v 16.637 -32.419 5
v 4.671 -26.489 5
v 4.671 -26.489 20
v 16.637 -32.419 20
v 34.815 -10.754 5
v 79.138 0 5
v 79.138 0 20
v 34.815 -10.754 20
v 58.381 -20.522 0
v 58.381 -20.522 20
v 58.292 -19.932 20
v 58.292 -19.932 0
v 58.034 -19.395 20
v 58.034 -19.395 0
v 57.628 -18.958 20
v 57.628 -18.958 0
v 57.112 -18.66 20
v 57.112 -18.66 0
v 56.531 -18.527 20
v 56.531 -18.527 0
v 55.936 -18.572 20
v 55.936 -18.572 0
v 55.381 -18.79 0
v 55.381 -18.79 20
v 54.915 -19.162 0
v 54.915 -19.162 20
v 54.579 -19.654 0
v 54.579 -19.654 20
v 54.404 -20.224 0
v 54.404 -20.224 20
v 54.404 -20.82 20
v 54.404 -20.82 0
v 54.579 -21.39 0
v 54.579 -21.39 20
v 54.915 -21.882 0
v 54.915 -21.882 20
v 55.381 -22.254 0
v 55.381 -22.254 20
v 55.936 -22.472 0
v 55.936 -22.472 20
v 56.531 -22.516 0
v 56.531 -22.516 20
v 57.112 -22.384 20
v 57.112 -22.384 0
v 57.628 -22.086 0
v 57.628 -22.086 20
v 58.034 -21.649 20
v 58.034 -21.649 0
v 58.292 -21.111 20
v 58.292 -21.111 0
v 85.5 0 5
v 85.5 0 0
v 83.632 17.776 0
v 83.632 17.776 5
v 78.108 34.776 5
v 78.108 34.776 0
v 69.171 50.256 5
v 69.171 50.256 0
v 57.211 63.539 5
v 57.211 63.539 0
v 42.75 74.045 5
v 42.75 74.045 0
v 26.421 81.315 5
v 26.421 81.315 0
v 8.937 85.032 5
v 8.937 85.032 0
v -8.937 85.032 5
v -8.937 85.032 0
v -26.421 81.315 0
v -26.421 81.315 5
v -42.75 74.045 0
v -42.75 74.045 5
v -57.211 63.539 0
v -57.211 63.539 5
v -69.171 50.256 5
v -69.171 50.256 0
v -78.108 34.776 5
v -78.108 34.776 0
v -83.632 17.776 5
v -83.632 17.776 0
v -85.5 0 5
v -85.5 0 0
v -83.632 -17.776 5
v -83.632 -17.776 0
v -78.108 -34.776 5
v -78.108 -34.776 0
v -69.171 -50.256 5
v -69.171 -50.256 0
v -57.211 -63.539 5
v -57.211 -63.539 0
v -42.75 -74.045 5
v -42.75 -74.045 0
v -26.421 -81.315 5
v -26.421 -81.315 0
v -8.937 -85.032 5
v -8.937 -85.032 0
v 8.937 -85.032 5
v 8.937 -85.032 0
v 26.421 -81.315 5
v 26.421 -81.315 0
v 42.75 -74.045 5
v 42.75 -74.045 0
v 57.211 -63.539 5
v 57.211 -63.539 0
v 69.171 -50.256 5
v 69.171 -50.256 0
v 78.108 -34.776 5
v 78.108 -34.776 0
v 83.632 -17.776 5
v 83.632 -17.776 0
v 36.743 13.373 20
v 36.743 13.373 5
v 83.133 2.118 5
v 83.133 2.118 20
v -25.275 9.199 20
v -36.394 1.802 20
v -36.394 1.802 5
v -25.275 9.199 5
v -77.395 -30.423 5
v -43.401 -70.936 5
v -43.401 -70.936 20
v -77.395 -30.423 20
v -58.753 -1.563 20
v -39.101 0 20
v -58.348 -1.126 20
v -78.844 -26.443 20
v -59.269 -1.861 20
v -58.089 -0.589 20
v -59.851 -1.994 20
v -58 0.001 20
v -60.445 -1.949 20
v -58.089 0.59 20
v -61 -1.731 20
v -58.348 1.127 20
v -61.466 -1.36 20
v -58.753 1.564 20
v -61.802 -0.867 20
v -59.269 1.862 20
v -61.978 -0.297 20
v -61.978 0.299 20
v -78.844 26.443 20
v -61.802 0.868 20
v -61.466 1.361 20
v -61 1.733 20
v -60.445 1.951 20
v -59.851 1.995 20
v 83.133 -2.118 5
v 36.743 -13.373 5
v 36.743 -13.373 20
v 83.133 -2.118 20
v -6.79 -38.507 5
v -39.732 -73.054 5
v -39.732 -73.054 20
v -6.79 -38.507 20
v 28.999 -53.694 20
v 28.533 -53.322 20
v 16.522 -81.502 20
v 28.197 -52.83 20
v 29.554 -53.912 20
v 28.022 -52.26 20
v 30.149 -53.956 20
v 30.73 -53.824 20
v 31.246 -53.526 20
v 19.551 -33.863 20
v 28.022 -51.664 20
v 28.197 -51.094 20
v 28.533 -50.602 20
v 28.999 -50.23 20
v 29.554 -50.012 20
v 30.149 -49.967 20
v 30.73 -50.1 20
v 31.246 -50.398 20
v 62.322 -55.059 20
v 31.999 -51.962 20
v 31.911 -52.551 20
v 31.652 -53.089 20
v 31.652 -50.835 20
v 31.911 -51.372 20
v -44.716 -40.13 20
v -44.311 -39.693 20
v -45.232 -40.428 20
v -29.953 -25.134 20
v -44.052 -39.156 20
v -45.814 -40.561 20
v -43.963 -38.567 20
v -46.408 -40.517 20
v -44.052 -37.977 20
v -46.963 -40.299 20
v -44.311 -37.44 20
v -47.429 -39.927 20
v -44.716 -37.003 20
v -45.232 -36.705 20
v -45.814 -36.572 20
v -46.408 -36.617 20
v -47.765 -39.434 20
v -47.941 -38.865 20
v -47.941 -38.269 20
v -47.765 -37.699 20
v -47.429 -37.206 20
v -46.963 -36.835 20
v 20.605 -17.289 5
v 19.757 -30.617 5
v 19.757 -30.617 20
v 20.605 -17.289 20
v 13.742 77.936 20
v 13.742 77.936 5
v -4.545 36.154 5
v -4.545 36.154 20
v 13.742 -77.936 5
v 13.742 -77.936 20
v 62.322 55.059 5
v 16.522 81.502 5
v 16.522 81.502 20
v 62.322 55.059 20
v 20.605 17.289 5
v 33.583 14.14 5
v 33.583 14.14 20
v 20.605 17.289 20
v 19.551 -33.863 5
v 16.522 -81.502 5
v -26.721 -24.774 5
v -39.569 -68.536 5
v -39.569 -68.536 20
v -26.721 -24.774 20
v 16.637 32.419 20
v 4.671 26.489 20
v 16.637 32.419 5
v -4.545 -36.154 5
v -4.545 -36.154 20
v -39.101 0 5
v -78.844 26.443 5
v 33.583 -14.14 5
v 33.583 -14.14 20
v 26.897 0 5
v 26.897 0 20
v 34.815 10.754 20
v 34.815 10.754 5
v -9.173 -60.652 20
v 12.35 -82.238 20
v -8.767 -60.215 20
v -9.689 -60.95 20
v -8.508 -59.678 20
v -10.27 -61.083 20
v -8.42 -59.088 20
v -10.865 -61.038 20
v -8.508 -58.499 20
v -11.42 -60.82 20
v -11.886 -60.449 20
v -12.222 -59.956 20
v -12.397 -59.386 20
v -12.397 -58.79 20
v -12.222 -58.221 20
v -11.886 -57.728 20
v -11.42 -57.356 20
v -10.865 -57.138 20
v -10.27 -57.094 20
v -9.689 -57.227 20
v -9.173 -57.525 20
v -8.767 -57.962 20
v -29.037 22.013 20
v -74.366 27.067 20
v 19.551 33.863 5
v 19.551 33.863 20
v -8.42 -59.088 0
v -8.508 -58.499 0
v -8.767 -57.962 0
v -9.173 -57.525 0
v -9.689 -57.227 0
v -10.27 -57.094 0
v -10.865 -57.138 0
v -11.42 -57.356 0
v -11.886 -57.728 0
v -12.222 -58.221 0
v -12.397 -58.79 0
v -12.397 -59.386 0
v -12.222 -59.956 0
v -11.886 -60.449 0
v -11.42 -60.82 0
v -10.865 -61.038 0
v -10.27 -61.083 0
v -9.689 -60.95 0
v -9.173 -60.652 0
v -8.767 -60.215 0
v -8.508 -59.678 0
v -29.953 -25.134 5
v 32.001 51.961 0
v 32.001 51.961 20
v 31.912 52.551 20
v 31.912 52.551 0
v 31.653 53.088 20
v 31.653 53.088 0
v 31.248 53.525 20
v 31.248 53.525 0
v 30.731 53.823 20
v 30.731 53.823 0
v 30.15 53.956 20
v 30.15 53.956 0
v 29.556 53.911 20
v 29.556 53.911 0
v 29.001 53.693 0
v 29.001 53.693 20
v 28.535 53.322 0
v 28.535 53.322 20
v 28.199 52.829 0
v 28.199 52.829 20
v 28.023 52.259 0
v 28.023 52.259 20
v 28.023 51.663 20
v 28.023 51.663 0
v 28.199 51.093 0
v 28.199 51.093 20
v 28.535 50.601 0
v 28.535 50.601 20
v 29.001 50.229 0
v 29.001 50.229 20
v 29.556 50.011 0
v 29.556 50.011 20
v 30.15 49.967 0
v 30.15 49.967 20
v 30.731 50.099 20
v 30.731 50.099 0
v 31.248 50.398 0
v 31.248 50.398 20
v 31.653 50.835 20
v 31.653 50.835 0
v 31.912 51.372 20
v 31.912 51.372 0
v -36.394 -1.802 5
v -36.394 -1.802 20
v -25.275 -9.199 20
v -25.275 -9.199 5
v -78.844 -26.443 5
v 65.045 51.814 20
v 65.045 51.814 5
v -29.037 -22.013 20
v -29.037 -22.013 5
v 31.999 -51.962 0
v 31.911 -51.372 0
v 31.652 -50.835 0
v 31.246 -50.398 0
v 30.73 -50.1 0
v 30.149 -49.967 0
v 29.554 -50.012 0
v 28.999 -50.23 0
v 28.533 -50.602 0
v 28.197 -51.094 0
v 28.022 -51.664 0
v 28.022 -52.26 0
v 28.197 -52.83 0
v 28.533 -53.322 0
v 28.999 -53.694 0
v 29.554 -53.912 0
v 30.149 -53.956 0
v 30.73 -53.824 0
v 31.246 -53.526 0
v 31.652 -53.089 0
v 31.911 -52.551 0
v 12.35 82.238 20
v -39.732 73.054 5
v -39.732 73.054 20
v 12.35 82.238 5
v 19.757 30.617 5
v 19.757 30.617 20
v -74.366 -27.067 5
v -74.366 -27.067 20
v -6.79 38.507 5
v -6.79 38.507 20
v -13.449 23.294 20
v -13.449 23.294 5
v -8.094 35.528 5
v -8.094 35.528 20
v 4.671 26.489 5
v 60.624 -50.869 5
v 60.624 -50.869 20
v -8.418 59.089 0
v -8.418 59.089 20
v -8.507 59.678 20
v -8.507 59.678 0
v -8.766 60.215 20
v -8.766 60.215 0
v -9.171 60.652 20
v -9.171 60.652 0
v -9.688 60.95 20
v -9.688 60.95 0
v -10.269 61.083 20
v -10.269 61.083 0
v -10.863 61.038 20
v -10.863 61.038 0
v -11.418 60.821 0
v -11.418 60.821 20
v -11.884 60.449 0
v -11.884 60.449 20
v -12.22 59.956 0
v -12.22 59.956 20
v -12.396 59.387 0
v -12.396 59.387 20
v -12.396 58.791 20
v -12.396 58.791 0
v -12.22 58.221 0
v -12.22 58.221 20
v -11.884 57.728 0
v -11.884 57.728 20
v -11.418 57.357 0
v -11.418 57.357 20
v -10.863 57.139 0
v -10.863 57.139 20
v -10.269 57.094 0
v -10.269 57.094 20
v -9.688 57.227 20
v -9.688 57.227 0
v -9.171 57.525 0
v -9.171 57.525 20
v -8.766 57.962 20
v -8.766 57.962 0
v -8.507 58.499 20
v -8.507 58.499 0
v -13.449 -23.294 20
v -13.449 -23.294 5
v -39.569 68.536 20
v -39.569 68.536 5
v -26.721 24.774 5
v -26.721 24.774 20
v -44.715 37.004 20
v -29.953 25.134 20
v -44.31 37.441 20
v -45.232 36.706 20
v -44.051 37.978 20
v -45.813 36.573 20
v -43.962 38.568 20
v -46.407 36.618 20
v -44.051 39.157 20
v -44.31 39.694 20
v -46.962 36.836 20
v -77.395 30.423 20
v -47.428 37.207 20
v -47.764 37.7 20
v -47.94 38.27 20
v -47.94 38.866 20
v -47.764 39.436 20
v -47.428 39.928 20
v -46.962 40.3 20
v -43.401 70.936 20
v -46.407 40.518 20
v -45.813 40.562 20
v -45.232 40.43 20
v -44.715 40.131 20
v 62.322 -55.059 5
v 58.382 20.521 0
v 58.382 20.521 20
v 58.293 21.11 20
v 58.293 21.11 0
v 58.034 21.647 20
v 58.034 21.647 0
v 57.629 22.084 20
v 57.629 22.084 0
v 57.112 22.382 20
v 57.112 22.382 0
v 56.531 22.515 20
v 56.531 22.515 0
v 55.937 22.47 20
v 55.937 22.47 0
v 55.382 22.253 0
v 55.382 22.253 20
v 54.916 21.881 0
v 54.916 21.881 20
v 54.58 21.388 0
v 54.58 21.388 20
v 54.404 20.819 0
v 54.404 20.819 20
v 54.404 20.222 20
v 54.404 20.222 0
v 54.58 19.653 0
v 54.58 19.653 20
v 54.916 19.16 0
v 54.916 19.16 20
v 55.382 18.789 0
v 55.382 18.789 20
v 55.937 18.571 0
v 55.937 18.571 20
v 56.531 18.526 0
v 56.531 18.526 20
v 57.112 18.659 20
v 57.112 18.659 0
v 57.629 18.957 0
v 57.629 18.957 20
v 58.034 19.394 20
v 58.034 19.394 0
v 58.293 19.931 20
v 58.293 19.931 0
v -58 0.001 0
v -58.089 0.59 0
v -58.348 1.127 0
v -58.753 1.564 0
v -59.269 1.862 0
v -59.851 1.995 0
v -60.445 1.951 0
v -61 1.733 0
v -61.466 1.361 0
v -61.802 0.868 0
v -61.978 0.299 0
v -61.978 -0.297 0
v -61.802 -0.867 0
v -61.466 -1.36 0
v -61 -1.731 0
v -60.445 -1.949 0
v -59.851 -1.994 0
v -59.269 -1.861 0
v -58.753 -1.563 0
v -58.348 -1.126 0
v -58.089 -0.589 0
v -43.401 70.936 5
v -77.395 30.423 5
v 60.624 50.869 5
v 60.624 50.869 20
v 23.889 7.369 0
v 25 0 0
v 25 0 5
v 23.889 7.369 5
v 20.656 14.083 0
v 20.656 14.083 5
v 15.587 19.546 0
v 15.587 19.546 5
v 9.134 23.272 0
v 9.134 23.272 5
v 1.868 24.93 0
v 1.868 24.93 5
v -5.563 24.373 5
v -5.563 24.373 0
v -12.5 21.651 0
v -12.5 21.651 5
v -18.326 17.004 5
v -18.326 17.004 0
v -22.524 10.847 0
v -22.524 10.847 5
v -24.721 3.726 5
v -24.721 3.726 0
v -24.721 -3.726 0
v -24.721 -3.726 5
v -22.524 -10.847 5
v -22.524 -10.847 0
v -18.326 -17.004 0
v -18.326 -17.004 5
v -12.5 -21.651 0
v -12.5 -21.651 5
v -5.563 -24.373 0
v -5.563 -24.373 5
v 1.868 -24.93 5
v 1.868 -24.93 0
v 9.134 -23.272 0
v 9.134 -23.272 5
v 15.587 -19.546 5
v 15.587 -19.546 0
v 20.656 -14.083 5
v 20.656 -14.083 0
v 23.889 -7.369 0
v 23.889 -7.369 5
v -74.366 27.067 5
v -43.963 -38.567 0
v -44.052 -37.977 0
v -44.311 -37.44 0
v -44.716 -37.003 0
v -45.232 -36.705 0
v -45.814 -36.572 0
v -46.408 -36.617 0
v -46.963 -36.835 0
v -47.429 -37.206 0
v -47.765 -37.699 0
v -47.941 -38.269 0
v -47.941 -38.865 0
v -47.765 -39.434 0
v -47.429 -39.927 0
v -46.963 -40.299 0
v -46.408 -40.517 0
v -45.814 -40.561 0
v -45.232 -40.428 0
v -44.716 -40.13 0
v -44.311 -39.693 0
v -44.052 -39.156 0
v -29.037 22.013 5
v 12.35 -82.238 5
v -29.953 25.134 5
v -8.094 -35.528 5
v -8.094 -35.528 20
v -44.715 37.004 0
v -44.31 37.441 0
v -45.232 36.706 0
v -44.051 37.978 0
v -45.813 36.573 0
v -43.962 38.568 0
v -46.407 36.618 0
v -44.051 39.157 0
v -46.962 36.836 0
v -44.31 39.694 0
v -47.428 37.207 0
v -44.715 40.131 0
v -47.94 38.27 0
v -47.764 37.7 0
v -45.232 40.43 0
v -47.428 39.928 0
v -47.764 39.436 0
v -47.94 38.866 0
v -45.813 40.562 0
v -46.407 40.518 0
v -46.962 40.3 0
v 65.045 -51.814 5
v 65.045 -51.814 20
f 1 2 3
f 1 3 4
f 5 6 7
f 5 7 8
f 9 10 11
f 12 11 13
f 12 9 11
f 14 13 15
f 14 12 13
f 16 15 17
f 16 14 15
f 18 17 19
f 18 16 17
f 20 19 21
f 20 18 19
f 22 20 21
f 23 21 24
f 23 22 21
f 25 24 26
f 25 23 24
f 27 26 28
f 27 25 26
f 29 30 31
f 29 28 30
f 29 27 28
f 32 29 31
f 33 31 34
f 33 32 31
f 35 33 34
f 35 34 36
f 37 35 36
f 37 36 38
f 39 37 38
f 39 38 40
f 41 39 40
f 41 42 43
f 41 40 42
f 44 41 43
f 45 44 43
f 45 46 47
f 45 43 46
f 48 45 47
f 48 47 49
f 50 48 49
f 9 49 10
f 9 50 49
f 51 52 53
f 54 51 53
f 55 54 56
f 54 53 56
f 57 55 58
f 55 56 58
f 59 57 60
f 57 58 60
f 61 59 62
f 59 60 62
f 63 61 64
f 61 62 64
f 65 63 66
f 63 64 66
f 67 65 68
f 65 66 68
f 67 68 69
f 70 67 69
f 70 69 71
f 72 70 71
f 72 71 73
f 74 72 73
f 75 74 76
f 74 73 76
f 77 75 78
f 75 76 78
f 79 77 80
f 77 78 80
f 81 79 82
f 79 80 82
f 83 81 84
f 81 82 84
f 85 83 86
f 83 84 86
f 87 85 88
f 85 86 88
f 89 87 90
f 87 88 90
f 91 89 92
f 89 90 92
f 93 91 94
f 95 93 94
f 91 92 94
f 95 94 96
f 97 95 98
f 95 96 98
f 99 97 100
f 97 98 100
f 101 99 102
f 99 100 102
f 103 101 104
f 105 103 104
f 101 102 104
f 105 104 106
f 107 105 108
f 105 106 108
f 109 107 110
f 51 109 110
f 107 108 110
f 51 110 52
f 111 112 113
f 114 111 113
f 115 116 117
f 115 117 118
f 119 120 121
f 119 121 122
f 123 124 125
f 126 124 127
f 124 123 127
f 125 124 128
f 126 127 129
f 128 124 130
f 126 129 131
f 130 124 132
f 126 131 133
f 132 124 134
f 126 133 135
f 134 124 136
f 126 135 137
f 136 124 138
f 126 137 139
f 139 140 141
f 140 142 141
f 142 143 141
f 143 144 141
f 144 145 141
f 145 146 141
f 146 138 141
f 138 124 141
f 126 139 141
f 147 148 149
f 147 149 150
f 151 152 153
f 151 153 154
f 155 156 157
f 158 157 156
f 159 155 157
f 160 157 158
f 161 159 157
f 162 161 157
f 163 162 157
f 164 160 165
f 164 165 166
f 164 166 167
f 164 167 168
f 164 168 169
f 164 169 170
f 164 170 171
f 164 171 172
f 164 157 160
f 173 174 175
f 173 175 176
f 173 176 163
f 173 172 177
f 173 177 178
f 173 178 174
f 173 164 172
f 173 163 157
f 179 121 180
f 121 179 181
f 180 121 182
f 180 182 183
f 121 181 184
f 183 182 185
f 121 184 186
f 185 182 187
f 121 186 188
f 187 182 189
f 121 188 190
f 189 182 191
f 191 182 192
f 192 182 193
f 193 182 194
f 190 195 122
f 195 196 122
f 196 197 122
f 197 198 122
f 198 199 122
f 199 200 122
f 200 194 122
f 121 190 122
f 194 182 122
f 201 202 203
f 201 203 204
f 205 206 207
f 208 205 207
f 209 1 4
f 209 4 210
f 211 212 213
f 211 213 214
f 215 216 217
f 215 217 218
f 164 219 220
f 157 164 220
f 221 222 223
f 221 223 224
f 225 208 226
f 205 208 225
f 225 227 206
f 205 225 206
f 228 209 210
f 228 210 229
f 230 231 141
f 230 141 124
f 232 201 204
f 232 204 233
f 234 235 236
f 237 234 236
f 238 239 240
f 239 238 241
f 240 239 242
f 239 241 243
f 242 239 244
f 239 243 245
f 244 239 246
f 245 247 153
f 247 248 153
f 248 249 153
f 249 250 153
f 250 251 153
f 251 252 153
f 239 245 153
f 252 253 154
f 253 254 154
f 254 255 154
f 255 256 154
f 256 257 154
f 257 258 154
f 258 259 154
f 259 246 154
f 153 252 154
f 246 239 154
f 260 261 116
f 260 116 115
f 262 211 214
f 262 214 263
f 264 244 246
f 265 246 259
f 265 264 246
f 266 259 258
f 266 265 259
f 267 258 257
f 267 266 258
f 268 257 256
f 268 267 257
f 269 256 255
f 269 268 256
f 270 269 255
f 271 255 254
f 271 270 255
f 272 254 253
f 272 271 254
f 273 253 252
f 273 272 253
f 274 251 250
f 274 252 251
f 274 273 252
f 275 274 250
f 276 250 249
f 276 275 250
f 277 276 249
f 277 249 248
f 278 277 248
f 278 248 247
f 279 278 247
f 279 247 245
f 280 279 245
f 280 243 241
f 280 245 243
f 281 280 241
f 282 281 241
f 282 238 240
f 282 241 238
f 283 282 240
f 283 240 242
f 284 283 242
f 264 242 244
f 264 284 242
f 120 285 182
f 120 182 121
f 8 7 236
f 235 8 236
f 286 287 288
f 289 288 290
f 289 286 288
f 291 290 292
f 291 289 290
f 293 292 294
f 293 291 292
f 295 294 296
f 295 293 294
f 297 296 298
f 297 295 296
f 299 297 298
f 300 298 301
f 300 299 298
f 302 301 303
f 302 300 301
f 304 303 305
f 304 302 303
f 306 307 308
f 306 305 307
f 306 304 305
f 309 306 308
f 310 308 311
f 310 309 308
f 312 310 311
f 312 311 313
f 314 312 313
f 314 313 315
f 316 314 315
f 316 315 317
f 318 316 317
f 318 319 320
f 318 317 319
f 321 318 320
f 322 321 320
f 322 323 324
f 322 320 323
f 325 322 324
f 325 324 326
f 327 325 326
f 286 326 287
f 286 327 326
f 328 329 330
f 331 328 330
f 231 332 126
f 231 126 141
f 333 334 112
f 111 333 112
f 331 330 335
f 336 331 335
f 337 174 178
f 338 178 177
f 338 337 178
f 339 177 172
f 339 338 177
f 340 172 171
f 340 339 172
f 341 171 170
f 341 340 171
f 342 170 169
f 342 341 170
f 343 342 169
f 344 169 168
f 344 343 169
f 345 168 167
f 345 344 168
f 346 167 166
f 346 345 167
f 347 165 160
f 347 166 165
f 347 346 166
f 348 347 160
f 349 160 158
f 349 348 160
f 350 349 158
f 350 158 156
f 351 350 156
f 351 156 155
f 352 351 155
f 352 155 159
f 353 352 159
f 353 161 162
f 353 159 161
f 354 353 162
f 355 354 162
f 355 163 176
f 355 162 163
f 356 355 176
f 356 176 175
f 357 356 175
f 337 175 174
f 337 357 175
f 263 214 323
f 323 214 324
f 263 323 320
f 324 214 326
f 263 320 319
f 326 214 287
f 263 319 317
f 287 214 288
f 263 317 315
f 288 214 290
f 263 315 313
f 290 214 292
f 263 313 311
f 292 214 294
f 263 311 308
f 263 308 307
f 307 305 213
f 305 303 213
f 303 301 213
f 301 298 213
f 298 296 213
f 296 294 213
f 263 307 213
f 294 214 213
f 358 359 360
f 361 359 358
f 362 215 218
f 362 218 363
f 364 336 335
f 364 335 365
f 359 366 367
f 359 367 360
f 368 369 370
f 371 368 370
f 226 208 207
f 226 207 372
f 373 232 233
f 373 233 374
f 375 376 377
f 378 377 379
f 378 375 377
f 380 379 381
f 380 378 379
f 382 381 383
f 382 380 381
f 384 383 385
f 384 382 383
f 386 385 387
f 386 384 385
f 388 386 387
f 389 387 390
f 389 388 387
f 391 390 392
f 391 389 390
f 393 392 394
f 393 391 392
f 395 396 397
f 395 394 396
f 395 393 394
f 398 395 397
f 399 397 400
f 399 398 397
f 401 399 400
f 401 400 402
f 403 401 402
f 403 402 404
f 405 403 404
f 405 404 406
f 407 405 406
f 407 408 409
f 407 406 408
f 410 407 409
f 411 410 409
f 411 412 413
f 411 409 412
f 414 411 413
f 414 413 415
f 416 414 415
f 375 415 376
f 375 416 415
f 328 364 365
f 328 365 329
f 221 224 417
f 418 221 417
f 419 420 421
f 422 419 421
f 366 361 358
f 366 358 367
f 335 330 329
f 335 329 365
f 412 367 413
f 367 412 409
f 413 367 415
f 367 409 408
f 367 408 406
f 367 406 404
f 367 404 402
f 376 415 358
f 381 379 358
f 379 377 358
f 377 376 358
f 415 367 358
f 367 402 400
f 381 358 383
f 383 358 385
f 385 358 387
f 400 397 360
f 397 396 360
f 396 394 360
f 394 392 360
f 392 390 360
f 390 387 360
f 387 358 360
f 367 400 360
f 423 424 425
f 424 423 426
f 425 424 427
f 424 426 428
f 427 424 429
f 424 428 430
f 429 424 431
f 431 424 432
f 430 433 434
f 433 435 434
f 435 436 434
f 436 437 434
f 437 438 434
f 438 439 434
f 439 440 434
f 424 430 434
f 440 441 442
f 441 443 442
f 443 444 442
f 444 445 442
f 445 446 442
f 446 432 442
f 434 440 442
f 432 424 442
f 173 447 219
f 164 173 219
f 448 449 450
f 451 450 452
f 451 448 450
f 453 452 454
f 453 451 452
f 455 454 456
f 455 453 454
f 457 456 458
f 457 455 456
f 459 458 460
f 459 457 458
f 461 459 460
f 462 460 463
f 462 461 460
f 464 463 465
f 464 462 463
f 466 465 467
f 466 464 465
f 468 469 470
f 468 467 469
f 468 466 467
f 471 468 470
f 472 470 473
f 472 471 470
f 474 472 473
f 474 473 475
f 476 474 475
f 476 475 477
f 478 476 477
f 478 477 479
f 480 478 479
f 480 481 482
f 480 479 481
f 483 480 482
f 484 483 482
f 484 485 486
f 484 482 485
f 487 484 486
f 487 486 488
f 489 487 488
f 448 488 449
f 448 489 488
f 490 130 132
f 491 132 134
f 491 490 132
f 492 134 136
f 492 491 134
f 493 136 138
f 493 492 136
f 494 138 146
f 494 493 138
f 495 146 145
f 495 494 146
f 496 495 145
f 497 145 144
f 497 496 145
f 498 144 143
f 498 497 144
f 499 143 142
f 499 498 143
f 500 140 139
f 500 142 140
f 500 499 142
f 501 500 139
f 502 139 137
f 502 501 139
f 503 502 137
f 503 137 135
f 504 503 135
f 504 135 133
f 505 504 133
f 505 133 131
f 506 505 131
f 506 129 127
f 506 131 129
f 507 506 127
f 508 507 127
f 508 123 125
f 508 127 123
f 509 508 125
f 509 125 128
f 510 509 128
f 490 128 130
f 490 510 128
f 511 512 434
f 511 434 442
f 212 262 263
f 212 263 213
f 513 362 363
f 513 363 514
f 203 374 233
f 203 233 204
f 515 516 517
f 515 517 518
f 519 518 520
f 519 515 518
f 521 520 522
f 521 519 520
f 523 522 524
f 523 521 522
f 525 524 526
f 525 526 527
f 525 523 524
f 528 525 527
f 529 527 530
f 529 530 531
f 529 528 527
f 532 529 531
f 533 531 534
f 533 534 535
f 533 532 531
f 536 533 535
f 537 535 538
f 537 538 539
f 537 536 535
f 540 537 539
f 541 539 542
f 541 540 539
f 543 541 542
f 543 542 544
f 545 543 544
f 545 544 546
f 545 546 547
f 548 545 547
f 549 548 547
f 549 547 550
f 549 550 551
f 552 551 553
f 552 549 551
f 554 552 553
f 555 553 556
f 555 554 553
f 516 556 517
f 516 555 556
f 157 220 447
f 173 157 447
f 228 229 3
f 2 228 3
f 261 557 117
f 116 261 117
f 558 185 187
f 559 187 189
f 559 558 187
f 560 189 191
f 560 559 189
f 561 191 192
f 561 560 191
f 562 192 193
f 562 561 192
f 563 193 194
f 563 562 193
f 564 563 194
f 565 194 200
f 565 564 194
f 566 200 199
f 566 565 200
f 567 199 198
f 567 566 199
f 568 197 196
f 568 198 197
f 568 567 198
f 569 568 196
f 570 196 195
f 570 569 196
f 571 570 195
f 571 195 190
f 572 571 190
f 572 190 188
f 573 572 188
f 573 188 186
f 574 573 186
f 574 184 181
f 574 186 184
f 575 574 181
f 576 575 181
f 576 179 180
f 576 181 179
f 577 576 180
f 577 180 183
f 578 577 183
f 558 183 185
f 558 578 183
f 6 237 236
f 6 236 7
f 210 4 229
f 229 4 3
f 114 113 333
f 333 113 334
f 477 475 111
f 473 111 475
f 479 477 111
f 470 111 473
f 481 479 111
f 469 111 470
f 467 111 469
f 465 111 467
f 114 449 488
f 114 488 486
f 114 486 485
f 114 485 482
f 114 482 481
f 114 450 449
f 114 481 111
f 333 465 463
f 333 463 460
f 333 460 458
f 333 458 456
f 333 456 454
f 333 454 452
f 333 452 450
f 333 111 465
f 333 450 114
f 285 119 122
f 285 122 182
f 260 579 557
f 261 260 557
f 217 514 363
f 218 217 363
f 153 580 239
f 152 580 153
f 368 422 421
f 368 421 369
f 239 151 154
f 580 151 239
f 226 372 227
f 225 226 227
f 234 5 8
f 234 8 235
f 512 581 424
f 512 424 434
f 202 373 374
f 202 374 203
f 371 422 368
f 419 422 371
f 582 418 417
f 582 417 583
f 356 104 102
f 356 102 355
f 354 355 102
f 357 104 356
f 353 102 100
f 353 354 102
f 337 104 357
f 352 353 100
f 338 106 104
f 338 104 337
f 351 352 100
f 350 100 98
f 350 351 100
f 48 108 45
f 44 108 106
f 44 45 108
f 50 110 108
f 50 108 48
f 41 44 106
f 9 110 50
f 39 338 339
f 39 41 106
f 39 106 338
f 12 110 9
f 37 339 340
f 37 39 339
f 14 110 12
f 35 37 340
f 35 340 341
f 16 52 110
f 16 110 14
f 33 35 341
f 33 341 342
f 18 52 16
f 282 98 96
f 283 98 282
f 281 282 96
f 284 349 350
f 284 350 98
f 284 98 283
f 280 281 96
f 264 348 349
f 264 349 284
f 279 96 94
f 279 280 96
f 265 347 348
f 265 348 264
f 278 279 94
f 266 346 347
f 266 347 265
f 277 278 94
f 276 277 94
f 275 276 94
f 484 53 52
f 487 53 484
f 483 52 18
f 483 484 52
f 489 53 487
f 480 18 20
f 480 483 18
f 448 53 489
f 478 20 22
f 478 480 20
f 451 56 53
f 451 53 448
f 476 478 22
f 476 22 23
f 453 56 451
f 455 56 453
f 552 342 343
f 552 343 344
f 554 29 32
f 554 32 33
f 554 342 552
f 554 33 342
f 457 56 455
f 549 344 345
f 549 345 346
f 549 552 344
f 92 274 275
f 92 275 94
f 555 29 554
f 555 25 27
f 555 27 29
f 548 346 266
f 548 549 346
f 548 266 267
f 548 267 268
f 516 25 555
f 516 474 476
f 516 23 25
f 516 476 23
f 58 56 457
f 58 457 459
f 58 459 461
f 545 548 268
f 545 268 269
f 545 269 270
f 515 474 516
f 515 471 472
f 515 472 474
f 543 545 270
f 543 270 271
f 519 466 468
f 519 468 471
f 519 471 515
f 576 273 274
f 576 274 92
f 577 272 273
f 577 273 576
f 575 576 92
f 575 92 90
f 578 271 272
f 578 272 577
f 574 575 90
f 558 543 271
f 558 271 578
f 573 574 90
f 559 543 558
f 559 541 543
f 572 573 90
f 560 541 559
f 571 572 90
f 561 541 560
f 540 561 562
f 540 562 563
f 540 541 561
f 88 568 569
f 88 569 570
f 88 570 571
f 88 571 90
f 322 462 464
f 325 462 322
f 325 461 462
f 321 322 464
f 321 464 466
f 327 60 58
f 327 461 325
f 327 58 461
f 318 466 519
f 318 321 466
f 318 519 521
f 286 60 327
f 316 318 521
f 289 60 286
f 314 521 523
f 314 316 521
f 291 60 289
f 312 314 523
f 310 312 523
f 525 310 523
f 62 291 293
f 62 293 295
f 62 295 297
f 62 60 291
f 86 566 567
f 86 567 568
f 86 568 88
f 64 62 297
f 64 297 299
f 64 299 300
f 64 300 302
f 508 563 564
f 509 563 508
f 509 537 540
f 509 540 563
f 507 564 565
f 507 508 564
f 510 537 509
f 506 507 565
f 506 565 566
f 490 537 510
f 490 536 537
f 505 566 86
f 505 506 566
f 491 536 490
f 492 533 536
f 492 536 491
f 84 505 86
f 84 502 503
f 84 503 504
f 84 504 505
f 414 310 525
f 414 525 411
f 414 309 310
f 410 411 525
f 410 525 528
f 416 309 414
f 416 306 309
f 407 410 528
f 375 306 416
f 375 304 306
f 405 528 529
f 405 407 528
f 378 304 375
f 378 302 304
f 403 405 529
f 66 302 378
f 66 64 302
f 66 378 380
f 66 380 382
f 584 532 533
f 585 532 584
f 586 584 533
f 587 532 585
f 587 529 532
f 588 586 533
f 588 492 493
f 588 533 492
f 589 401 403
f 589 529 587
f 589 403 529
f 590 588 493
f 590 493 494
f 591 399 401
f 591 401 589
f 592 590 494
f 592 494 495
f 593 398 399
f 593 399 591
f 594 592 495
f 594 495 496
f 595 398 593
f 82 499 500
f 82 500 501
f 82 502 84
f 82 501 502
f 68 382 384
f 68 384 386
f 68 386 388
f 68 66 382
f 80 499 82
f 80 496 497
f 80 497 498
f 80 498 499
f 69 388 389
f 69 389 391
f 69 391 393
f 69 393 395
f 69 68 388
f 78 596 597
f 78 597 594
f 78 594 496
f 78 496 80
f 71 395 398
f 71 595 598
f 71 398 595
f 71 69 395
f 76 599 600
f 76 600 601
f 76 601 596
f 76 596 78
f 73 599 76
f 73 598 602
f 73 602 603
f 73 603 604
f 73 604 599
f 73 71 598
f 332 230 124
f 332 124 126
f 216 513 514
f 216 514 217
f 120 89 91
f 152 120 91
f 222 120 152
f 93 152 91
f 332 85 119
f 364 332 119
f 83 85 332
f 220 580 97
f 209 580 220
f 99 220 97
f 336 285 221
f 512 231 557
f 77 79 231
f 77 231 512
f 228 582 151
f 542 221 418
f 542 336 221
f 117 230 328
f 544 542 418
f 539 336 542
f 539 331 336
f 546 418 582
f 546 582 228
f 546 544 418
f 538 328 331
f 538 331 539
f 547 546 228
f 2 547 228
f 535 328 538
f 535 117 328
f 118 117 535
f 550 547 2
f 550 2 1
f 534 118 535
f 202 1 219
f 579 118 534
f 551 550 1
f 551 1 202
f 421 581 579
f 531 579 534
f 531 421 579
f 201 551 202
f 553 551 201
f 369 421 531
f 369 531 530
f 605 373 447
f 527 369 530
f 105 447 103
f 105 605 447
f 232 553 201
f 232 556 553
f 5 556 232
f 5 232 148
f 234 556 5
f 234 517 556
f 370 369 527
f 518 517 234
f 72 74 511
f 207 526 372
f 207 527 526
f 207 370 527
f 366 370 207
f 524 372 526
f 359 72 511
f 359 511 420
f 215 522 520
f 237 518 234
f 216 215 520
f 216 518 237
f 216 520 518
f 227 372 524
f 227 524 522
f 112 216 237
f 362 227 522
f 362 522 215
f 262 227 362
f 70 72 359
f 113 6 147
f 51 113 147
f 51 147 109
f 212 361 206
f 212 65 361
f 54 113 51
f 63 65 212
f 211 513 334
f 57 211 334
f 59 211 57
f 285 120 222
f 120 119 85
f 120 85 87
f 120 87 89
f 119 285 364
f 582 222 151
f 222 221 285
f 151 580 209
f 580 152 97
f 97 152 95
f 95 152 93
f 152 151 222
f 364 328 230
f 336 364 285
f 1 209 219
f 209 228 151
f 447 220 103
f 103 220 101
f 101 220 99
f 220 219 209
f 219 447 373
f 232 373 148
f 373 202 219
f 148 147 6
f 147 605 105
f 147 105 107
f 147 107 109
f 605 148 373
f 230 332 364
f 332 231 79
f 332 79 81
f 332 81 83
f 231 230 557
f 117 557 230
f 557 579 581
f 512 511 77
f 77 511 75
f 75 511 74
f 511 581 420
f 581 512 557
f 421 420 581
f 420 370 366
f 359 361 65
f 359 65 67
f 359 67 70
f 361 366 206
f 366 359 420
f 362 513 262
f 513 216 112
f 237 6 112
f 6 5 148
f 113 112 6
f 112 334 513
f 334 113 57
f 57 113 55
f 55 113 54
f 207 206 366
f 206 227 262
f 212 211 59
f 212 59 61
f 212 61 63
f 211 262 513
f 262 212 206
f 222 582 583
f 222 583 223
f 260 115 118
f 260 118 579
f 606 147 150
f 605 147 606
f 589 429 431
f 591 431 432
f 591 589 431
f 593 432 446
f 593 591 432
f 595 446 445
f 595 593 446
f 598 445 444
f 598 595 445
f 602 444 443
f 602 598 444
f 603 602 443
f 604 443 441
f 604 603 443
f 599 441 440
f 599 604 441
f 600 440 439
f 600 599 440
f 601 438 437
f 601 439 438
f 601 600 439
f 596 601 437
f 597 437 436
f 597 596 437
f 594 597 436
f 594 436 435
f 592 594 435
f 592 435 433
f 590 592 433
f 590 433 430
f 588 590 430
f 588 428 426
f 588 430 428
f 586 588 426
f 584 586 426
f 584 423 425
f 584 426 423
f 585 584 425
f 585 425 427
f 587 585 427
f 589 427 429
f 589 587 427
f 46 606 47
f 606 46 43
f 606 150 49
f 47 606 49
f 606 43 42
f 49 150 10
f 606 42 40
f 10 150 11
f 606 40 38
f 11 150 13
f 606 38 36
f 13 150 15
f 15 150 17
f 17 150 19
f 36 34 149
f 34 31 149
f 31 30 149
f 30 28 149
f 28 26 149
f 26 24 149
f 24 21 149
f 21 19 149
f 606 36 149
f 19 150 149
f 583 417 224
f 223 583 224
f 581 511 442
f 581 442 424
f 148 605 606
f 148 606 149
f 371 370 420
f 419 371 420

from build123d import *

# Parameters (mm, degrees)
SKETCH002_R   = 85.5
SKETCH002_R_2 = 25
PAD_DEPTH     = 5
PAD001_DEPTH  = 20
SKETCH001_R   = 2
POCKET_DEPTH  = 20.001


with BuildPart() as part:
    # Sketch002 → Pad (new body)
    with BuildSketch(Plane.XY):
        Circle(SKETCH002_R)
        Circle(SKETCH002_R_2, mode=Mode.SUBTRACT)
    extrude(amount=PAD_DEPTH)

    # Sketch → Pad001 (join)
    with BuildSketch(Plane.XY):
        Polygon((16.521561, 81.502157), (62.322158, 55.05917), (19.550743, 33.86288), align=None)
        Polygon((-39.732327, 73.054129), (12.350191, 82.237682), (-6.789902, 38.507446), align=None)
        Polygon((13.742249, 77.936164), (-4.545372, 36.15361), (4.670681, 26.488746), (16.636515, 32.418672), align=None)
        Polygon((19.757136, 30.616981), (60.623574, 50.869218), (33.582631, 14.140398), (20.604587, 17.289301), align=None)
        Polygon((65.044827, 51.81442), (36.743377, 13.373496), (83.132895, 2.11786), align=None)
        Polygon((34.81506, 10.754326), (79.138455, 0), (34.81506, -10.754326), (26.897378, 0), align=None)
        Polygon((36.743377, -13.373496), (83.132895, -2.11786), (65.044827, -51.81442), align=None)
        Polygon((20.604587, -17.289301), (33.582631, -14.140398), (60.623574, -50.869218), (19.757136, -30.616981), align=None)
        Polygon((19.550743, -33.86288), (16.521561, -81.502157), (62.322158, -55.05917), align=None)
        Polygon((4.670681, -26.488746), (16.636515, -32.418672), (13.742249, -77.936164), (-4.545372, -36.15361), align=None)
        Polygon((-6.789902, -38.507446), (12.350191, -82.237682), (-39.732327, -73.054129), align=None)
        Polygon((-26.721049, -24.773563), (-13.448689, -23.293813), (-8.094011, -35.527889), (-39.569228, -68.535913), align=None)
        Polygon((-29.953476, -25.13395), (-43.400568, -70.936269), (-77.395018, -30.423262), align=None)
        Polygon((-74.365822, -27.066946), (-36.393651, -1.801691), (-25.275268, -9.199445), (-29.037259, -22.013212), align=None)
        Polygon((-39.101485, 0), (-78.843719, -26.442988), (-78.843719, 26.442988), align=None)
        Polygon((-74.365822, 27.066946), (-36.393651, 1.801691), (-25.275268, 9.199445), (-29.037259, 22.013212), align=None)
        Polygon((-77.395018, 30.423262), (-43.400568, 70.936269), (-29.953476, 25.13395), align=None)
        Polygon((-39.569228, 68.535913), (-26.721049, 24.773563), (-13.448689, 23.293813), (-8.094011, 35.527889), align=None)
    extrude(amount=PAD001_DEPTH)

    # Sketch001 → Pocket (cut, through all)
    with BuildSketch(Plane.XY):
        with Locations((-10.418201, 59.088587)):
            Circle(SKETCH001_R)
        with Locations((30.000606, 51.961174)):
            Circle(SKETCH001_R)
        with Locations((-45.962216, 38.567793)):
            Circle(SKETCH001_R)
        with Locations((-60, 0.0007)):
            Circle(SKETCH001_R)
        with Locations((-45.963117, -38.56672)):
            Circle(SKETCH001_R)
        with Locations((-10.41958, -59.088344)):
            Circle(SKETCH001_R)
        with Locations((29.999394, -51.961874)):
            Circle(SKETCH001_R)
        with Locations((56.381318, -20.521867)):
            Circle(SKETCH001_R)
        with Locations((56.381797, 20.520551)):
            Circle(SKETCH001_R)
    extrude(amount=POCKET_DEPTH, mode=Mode.SUBTRACT)


solid = part.part
